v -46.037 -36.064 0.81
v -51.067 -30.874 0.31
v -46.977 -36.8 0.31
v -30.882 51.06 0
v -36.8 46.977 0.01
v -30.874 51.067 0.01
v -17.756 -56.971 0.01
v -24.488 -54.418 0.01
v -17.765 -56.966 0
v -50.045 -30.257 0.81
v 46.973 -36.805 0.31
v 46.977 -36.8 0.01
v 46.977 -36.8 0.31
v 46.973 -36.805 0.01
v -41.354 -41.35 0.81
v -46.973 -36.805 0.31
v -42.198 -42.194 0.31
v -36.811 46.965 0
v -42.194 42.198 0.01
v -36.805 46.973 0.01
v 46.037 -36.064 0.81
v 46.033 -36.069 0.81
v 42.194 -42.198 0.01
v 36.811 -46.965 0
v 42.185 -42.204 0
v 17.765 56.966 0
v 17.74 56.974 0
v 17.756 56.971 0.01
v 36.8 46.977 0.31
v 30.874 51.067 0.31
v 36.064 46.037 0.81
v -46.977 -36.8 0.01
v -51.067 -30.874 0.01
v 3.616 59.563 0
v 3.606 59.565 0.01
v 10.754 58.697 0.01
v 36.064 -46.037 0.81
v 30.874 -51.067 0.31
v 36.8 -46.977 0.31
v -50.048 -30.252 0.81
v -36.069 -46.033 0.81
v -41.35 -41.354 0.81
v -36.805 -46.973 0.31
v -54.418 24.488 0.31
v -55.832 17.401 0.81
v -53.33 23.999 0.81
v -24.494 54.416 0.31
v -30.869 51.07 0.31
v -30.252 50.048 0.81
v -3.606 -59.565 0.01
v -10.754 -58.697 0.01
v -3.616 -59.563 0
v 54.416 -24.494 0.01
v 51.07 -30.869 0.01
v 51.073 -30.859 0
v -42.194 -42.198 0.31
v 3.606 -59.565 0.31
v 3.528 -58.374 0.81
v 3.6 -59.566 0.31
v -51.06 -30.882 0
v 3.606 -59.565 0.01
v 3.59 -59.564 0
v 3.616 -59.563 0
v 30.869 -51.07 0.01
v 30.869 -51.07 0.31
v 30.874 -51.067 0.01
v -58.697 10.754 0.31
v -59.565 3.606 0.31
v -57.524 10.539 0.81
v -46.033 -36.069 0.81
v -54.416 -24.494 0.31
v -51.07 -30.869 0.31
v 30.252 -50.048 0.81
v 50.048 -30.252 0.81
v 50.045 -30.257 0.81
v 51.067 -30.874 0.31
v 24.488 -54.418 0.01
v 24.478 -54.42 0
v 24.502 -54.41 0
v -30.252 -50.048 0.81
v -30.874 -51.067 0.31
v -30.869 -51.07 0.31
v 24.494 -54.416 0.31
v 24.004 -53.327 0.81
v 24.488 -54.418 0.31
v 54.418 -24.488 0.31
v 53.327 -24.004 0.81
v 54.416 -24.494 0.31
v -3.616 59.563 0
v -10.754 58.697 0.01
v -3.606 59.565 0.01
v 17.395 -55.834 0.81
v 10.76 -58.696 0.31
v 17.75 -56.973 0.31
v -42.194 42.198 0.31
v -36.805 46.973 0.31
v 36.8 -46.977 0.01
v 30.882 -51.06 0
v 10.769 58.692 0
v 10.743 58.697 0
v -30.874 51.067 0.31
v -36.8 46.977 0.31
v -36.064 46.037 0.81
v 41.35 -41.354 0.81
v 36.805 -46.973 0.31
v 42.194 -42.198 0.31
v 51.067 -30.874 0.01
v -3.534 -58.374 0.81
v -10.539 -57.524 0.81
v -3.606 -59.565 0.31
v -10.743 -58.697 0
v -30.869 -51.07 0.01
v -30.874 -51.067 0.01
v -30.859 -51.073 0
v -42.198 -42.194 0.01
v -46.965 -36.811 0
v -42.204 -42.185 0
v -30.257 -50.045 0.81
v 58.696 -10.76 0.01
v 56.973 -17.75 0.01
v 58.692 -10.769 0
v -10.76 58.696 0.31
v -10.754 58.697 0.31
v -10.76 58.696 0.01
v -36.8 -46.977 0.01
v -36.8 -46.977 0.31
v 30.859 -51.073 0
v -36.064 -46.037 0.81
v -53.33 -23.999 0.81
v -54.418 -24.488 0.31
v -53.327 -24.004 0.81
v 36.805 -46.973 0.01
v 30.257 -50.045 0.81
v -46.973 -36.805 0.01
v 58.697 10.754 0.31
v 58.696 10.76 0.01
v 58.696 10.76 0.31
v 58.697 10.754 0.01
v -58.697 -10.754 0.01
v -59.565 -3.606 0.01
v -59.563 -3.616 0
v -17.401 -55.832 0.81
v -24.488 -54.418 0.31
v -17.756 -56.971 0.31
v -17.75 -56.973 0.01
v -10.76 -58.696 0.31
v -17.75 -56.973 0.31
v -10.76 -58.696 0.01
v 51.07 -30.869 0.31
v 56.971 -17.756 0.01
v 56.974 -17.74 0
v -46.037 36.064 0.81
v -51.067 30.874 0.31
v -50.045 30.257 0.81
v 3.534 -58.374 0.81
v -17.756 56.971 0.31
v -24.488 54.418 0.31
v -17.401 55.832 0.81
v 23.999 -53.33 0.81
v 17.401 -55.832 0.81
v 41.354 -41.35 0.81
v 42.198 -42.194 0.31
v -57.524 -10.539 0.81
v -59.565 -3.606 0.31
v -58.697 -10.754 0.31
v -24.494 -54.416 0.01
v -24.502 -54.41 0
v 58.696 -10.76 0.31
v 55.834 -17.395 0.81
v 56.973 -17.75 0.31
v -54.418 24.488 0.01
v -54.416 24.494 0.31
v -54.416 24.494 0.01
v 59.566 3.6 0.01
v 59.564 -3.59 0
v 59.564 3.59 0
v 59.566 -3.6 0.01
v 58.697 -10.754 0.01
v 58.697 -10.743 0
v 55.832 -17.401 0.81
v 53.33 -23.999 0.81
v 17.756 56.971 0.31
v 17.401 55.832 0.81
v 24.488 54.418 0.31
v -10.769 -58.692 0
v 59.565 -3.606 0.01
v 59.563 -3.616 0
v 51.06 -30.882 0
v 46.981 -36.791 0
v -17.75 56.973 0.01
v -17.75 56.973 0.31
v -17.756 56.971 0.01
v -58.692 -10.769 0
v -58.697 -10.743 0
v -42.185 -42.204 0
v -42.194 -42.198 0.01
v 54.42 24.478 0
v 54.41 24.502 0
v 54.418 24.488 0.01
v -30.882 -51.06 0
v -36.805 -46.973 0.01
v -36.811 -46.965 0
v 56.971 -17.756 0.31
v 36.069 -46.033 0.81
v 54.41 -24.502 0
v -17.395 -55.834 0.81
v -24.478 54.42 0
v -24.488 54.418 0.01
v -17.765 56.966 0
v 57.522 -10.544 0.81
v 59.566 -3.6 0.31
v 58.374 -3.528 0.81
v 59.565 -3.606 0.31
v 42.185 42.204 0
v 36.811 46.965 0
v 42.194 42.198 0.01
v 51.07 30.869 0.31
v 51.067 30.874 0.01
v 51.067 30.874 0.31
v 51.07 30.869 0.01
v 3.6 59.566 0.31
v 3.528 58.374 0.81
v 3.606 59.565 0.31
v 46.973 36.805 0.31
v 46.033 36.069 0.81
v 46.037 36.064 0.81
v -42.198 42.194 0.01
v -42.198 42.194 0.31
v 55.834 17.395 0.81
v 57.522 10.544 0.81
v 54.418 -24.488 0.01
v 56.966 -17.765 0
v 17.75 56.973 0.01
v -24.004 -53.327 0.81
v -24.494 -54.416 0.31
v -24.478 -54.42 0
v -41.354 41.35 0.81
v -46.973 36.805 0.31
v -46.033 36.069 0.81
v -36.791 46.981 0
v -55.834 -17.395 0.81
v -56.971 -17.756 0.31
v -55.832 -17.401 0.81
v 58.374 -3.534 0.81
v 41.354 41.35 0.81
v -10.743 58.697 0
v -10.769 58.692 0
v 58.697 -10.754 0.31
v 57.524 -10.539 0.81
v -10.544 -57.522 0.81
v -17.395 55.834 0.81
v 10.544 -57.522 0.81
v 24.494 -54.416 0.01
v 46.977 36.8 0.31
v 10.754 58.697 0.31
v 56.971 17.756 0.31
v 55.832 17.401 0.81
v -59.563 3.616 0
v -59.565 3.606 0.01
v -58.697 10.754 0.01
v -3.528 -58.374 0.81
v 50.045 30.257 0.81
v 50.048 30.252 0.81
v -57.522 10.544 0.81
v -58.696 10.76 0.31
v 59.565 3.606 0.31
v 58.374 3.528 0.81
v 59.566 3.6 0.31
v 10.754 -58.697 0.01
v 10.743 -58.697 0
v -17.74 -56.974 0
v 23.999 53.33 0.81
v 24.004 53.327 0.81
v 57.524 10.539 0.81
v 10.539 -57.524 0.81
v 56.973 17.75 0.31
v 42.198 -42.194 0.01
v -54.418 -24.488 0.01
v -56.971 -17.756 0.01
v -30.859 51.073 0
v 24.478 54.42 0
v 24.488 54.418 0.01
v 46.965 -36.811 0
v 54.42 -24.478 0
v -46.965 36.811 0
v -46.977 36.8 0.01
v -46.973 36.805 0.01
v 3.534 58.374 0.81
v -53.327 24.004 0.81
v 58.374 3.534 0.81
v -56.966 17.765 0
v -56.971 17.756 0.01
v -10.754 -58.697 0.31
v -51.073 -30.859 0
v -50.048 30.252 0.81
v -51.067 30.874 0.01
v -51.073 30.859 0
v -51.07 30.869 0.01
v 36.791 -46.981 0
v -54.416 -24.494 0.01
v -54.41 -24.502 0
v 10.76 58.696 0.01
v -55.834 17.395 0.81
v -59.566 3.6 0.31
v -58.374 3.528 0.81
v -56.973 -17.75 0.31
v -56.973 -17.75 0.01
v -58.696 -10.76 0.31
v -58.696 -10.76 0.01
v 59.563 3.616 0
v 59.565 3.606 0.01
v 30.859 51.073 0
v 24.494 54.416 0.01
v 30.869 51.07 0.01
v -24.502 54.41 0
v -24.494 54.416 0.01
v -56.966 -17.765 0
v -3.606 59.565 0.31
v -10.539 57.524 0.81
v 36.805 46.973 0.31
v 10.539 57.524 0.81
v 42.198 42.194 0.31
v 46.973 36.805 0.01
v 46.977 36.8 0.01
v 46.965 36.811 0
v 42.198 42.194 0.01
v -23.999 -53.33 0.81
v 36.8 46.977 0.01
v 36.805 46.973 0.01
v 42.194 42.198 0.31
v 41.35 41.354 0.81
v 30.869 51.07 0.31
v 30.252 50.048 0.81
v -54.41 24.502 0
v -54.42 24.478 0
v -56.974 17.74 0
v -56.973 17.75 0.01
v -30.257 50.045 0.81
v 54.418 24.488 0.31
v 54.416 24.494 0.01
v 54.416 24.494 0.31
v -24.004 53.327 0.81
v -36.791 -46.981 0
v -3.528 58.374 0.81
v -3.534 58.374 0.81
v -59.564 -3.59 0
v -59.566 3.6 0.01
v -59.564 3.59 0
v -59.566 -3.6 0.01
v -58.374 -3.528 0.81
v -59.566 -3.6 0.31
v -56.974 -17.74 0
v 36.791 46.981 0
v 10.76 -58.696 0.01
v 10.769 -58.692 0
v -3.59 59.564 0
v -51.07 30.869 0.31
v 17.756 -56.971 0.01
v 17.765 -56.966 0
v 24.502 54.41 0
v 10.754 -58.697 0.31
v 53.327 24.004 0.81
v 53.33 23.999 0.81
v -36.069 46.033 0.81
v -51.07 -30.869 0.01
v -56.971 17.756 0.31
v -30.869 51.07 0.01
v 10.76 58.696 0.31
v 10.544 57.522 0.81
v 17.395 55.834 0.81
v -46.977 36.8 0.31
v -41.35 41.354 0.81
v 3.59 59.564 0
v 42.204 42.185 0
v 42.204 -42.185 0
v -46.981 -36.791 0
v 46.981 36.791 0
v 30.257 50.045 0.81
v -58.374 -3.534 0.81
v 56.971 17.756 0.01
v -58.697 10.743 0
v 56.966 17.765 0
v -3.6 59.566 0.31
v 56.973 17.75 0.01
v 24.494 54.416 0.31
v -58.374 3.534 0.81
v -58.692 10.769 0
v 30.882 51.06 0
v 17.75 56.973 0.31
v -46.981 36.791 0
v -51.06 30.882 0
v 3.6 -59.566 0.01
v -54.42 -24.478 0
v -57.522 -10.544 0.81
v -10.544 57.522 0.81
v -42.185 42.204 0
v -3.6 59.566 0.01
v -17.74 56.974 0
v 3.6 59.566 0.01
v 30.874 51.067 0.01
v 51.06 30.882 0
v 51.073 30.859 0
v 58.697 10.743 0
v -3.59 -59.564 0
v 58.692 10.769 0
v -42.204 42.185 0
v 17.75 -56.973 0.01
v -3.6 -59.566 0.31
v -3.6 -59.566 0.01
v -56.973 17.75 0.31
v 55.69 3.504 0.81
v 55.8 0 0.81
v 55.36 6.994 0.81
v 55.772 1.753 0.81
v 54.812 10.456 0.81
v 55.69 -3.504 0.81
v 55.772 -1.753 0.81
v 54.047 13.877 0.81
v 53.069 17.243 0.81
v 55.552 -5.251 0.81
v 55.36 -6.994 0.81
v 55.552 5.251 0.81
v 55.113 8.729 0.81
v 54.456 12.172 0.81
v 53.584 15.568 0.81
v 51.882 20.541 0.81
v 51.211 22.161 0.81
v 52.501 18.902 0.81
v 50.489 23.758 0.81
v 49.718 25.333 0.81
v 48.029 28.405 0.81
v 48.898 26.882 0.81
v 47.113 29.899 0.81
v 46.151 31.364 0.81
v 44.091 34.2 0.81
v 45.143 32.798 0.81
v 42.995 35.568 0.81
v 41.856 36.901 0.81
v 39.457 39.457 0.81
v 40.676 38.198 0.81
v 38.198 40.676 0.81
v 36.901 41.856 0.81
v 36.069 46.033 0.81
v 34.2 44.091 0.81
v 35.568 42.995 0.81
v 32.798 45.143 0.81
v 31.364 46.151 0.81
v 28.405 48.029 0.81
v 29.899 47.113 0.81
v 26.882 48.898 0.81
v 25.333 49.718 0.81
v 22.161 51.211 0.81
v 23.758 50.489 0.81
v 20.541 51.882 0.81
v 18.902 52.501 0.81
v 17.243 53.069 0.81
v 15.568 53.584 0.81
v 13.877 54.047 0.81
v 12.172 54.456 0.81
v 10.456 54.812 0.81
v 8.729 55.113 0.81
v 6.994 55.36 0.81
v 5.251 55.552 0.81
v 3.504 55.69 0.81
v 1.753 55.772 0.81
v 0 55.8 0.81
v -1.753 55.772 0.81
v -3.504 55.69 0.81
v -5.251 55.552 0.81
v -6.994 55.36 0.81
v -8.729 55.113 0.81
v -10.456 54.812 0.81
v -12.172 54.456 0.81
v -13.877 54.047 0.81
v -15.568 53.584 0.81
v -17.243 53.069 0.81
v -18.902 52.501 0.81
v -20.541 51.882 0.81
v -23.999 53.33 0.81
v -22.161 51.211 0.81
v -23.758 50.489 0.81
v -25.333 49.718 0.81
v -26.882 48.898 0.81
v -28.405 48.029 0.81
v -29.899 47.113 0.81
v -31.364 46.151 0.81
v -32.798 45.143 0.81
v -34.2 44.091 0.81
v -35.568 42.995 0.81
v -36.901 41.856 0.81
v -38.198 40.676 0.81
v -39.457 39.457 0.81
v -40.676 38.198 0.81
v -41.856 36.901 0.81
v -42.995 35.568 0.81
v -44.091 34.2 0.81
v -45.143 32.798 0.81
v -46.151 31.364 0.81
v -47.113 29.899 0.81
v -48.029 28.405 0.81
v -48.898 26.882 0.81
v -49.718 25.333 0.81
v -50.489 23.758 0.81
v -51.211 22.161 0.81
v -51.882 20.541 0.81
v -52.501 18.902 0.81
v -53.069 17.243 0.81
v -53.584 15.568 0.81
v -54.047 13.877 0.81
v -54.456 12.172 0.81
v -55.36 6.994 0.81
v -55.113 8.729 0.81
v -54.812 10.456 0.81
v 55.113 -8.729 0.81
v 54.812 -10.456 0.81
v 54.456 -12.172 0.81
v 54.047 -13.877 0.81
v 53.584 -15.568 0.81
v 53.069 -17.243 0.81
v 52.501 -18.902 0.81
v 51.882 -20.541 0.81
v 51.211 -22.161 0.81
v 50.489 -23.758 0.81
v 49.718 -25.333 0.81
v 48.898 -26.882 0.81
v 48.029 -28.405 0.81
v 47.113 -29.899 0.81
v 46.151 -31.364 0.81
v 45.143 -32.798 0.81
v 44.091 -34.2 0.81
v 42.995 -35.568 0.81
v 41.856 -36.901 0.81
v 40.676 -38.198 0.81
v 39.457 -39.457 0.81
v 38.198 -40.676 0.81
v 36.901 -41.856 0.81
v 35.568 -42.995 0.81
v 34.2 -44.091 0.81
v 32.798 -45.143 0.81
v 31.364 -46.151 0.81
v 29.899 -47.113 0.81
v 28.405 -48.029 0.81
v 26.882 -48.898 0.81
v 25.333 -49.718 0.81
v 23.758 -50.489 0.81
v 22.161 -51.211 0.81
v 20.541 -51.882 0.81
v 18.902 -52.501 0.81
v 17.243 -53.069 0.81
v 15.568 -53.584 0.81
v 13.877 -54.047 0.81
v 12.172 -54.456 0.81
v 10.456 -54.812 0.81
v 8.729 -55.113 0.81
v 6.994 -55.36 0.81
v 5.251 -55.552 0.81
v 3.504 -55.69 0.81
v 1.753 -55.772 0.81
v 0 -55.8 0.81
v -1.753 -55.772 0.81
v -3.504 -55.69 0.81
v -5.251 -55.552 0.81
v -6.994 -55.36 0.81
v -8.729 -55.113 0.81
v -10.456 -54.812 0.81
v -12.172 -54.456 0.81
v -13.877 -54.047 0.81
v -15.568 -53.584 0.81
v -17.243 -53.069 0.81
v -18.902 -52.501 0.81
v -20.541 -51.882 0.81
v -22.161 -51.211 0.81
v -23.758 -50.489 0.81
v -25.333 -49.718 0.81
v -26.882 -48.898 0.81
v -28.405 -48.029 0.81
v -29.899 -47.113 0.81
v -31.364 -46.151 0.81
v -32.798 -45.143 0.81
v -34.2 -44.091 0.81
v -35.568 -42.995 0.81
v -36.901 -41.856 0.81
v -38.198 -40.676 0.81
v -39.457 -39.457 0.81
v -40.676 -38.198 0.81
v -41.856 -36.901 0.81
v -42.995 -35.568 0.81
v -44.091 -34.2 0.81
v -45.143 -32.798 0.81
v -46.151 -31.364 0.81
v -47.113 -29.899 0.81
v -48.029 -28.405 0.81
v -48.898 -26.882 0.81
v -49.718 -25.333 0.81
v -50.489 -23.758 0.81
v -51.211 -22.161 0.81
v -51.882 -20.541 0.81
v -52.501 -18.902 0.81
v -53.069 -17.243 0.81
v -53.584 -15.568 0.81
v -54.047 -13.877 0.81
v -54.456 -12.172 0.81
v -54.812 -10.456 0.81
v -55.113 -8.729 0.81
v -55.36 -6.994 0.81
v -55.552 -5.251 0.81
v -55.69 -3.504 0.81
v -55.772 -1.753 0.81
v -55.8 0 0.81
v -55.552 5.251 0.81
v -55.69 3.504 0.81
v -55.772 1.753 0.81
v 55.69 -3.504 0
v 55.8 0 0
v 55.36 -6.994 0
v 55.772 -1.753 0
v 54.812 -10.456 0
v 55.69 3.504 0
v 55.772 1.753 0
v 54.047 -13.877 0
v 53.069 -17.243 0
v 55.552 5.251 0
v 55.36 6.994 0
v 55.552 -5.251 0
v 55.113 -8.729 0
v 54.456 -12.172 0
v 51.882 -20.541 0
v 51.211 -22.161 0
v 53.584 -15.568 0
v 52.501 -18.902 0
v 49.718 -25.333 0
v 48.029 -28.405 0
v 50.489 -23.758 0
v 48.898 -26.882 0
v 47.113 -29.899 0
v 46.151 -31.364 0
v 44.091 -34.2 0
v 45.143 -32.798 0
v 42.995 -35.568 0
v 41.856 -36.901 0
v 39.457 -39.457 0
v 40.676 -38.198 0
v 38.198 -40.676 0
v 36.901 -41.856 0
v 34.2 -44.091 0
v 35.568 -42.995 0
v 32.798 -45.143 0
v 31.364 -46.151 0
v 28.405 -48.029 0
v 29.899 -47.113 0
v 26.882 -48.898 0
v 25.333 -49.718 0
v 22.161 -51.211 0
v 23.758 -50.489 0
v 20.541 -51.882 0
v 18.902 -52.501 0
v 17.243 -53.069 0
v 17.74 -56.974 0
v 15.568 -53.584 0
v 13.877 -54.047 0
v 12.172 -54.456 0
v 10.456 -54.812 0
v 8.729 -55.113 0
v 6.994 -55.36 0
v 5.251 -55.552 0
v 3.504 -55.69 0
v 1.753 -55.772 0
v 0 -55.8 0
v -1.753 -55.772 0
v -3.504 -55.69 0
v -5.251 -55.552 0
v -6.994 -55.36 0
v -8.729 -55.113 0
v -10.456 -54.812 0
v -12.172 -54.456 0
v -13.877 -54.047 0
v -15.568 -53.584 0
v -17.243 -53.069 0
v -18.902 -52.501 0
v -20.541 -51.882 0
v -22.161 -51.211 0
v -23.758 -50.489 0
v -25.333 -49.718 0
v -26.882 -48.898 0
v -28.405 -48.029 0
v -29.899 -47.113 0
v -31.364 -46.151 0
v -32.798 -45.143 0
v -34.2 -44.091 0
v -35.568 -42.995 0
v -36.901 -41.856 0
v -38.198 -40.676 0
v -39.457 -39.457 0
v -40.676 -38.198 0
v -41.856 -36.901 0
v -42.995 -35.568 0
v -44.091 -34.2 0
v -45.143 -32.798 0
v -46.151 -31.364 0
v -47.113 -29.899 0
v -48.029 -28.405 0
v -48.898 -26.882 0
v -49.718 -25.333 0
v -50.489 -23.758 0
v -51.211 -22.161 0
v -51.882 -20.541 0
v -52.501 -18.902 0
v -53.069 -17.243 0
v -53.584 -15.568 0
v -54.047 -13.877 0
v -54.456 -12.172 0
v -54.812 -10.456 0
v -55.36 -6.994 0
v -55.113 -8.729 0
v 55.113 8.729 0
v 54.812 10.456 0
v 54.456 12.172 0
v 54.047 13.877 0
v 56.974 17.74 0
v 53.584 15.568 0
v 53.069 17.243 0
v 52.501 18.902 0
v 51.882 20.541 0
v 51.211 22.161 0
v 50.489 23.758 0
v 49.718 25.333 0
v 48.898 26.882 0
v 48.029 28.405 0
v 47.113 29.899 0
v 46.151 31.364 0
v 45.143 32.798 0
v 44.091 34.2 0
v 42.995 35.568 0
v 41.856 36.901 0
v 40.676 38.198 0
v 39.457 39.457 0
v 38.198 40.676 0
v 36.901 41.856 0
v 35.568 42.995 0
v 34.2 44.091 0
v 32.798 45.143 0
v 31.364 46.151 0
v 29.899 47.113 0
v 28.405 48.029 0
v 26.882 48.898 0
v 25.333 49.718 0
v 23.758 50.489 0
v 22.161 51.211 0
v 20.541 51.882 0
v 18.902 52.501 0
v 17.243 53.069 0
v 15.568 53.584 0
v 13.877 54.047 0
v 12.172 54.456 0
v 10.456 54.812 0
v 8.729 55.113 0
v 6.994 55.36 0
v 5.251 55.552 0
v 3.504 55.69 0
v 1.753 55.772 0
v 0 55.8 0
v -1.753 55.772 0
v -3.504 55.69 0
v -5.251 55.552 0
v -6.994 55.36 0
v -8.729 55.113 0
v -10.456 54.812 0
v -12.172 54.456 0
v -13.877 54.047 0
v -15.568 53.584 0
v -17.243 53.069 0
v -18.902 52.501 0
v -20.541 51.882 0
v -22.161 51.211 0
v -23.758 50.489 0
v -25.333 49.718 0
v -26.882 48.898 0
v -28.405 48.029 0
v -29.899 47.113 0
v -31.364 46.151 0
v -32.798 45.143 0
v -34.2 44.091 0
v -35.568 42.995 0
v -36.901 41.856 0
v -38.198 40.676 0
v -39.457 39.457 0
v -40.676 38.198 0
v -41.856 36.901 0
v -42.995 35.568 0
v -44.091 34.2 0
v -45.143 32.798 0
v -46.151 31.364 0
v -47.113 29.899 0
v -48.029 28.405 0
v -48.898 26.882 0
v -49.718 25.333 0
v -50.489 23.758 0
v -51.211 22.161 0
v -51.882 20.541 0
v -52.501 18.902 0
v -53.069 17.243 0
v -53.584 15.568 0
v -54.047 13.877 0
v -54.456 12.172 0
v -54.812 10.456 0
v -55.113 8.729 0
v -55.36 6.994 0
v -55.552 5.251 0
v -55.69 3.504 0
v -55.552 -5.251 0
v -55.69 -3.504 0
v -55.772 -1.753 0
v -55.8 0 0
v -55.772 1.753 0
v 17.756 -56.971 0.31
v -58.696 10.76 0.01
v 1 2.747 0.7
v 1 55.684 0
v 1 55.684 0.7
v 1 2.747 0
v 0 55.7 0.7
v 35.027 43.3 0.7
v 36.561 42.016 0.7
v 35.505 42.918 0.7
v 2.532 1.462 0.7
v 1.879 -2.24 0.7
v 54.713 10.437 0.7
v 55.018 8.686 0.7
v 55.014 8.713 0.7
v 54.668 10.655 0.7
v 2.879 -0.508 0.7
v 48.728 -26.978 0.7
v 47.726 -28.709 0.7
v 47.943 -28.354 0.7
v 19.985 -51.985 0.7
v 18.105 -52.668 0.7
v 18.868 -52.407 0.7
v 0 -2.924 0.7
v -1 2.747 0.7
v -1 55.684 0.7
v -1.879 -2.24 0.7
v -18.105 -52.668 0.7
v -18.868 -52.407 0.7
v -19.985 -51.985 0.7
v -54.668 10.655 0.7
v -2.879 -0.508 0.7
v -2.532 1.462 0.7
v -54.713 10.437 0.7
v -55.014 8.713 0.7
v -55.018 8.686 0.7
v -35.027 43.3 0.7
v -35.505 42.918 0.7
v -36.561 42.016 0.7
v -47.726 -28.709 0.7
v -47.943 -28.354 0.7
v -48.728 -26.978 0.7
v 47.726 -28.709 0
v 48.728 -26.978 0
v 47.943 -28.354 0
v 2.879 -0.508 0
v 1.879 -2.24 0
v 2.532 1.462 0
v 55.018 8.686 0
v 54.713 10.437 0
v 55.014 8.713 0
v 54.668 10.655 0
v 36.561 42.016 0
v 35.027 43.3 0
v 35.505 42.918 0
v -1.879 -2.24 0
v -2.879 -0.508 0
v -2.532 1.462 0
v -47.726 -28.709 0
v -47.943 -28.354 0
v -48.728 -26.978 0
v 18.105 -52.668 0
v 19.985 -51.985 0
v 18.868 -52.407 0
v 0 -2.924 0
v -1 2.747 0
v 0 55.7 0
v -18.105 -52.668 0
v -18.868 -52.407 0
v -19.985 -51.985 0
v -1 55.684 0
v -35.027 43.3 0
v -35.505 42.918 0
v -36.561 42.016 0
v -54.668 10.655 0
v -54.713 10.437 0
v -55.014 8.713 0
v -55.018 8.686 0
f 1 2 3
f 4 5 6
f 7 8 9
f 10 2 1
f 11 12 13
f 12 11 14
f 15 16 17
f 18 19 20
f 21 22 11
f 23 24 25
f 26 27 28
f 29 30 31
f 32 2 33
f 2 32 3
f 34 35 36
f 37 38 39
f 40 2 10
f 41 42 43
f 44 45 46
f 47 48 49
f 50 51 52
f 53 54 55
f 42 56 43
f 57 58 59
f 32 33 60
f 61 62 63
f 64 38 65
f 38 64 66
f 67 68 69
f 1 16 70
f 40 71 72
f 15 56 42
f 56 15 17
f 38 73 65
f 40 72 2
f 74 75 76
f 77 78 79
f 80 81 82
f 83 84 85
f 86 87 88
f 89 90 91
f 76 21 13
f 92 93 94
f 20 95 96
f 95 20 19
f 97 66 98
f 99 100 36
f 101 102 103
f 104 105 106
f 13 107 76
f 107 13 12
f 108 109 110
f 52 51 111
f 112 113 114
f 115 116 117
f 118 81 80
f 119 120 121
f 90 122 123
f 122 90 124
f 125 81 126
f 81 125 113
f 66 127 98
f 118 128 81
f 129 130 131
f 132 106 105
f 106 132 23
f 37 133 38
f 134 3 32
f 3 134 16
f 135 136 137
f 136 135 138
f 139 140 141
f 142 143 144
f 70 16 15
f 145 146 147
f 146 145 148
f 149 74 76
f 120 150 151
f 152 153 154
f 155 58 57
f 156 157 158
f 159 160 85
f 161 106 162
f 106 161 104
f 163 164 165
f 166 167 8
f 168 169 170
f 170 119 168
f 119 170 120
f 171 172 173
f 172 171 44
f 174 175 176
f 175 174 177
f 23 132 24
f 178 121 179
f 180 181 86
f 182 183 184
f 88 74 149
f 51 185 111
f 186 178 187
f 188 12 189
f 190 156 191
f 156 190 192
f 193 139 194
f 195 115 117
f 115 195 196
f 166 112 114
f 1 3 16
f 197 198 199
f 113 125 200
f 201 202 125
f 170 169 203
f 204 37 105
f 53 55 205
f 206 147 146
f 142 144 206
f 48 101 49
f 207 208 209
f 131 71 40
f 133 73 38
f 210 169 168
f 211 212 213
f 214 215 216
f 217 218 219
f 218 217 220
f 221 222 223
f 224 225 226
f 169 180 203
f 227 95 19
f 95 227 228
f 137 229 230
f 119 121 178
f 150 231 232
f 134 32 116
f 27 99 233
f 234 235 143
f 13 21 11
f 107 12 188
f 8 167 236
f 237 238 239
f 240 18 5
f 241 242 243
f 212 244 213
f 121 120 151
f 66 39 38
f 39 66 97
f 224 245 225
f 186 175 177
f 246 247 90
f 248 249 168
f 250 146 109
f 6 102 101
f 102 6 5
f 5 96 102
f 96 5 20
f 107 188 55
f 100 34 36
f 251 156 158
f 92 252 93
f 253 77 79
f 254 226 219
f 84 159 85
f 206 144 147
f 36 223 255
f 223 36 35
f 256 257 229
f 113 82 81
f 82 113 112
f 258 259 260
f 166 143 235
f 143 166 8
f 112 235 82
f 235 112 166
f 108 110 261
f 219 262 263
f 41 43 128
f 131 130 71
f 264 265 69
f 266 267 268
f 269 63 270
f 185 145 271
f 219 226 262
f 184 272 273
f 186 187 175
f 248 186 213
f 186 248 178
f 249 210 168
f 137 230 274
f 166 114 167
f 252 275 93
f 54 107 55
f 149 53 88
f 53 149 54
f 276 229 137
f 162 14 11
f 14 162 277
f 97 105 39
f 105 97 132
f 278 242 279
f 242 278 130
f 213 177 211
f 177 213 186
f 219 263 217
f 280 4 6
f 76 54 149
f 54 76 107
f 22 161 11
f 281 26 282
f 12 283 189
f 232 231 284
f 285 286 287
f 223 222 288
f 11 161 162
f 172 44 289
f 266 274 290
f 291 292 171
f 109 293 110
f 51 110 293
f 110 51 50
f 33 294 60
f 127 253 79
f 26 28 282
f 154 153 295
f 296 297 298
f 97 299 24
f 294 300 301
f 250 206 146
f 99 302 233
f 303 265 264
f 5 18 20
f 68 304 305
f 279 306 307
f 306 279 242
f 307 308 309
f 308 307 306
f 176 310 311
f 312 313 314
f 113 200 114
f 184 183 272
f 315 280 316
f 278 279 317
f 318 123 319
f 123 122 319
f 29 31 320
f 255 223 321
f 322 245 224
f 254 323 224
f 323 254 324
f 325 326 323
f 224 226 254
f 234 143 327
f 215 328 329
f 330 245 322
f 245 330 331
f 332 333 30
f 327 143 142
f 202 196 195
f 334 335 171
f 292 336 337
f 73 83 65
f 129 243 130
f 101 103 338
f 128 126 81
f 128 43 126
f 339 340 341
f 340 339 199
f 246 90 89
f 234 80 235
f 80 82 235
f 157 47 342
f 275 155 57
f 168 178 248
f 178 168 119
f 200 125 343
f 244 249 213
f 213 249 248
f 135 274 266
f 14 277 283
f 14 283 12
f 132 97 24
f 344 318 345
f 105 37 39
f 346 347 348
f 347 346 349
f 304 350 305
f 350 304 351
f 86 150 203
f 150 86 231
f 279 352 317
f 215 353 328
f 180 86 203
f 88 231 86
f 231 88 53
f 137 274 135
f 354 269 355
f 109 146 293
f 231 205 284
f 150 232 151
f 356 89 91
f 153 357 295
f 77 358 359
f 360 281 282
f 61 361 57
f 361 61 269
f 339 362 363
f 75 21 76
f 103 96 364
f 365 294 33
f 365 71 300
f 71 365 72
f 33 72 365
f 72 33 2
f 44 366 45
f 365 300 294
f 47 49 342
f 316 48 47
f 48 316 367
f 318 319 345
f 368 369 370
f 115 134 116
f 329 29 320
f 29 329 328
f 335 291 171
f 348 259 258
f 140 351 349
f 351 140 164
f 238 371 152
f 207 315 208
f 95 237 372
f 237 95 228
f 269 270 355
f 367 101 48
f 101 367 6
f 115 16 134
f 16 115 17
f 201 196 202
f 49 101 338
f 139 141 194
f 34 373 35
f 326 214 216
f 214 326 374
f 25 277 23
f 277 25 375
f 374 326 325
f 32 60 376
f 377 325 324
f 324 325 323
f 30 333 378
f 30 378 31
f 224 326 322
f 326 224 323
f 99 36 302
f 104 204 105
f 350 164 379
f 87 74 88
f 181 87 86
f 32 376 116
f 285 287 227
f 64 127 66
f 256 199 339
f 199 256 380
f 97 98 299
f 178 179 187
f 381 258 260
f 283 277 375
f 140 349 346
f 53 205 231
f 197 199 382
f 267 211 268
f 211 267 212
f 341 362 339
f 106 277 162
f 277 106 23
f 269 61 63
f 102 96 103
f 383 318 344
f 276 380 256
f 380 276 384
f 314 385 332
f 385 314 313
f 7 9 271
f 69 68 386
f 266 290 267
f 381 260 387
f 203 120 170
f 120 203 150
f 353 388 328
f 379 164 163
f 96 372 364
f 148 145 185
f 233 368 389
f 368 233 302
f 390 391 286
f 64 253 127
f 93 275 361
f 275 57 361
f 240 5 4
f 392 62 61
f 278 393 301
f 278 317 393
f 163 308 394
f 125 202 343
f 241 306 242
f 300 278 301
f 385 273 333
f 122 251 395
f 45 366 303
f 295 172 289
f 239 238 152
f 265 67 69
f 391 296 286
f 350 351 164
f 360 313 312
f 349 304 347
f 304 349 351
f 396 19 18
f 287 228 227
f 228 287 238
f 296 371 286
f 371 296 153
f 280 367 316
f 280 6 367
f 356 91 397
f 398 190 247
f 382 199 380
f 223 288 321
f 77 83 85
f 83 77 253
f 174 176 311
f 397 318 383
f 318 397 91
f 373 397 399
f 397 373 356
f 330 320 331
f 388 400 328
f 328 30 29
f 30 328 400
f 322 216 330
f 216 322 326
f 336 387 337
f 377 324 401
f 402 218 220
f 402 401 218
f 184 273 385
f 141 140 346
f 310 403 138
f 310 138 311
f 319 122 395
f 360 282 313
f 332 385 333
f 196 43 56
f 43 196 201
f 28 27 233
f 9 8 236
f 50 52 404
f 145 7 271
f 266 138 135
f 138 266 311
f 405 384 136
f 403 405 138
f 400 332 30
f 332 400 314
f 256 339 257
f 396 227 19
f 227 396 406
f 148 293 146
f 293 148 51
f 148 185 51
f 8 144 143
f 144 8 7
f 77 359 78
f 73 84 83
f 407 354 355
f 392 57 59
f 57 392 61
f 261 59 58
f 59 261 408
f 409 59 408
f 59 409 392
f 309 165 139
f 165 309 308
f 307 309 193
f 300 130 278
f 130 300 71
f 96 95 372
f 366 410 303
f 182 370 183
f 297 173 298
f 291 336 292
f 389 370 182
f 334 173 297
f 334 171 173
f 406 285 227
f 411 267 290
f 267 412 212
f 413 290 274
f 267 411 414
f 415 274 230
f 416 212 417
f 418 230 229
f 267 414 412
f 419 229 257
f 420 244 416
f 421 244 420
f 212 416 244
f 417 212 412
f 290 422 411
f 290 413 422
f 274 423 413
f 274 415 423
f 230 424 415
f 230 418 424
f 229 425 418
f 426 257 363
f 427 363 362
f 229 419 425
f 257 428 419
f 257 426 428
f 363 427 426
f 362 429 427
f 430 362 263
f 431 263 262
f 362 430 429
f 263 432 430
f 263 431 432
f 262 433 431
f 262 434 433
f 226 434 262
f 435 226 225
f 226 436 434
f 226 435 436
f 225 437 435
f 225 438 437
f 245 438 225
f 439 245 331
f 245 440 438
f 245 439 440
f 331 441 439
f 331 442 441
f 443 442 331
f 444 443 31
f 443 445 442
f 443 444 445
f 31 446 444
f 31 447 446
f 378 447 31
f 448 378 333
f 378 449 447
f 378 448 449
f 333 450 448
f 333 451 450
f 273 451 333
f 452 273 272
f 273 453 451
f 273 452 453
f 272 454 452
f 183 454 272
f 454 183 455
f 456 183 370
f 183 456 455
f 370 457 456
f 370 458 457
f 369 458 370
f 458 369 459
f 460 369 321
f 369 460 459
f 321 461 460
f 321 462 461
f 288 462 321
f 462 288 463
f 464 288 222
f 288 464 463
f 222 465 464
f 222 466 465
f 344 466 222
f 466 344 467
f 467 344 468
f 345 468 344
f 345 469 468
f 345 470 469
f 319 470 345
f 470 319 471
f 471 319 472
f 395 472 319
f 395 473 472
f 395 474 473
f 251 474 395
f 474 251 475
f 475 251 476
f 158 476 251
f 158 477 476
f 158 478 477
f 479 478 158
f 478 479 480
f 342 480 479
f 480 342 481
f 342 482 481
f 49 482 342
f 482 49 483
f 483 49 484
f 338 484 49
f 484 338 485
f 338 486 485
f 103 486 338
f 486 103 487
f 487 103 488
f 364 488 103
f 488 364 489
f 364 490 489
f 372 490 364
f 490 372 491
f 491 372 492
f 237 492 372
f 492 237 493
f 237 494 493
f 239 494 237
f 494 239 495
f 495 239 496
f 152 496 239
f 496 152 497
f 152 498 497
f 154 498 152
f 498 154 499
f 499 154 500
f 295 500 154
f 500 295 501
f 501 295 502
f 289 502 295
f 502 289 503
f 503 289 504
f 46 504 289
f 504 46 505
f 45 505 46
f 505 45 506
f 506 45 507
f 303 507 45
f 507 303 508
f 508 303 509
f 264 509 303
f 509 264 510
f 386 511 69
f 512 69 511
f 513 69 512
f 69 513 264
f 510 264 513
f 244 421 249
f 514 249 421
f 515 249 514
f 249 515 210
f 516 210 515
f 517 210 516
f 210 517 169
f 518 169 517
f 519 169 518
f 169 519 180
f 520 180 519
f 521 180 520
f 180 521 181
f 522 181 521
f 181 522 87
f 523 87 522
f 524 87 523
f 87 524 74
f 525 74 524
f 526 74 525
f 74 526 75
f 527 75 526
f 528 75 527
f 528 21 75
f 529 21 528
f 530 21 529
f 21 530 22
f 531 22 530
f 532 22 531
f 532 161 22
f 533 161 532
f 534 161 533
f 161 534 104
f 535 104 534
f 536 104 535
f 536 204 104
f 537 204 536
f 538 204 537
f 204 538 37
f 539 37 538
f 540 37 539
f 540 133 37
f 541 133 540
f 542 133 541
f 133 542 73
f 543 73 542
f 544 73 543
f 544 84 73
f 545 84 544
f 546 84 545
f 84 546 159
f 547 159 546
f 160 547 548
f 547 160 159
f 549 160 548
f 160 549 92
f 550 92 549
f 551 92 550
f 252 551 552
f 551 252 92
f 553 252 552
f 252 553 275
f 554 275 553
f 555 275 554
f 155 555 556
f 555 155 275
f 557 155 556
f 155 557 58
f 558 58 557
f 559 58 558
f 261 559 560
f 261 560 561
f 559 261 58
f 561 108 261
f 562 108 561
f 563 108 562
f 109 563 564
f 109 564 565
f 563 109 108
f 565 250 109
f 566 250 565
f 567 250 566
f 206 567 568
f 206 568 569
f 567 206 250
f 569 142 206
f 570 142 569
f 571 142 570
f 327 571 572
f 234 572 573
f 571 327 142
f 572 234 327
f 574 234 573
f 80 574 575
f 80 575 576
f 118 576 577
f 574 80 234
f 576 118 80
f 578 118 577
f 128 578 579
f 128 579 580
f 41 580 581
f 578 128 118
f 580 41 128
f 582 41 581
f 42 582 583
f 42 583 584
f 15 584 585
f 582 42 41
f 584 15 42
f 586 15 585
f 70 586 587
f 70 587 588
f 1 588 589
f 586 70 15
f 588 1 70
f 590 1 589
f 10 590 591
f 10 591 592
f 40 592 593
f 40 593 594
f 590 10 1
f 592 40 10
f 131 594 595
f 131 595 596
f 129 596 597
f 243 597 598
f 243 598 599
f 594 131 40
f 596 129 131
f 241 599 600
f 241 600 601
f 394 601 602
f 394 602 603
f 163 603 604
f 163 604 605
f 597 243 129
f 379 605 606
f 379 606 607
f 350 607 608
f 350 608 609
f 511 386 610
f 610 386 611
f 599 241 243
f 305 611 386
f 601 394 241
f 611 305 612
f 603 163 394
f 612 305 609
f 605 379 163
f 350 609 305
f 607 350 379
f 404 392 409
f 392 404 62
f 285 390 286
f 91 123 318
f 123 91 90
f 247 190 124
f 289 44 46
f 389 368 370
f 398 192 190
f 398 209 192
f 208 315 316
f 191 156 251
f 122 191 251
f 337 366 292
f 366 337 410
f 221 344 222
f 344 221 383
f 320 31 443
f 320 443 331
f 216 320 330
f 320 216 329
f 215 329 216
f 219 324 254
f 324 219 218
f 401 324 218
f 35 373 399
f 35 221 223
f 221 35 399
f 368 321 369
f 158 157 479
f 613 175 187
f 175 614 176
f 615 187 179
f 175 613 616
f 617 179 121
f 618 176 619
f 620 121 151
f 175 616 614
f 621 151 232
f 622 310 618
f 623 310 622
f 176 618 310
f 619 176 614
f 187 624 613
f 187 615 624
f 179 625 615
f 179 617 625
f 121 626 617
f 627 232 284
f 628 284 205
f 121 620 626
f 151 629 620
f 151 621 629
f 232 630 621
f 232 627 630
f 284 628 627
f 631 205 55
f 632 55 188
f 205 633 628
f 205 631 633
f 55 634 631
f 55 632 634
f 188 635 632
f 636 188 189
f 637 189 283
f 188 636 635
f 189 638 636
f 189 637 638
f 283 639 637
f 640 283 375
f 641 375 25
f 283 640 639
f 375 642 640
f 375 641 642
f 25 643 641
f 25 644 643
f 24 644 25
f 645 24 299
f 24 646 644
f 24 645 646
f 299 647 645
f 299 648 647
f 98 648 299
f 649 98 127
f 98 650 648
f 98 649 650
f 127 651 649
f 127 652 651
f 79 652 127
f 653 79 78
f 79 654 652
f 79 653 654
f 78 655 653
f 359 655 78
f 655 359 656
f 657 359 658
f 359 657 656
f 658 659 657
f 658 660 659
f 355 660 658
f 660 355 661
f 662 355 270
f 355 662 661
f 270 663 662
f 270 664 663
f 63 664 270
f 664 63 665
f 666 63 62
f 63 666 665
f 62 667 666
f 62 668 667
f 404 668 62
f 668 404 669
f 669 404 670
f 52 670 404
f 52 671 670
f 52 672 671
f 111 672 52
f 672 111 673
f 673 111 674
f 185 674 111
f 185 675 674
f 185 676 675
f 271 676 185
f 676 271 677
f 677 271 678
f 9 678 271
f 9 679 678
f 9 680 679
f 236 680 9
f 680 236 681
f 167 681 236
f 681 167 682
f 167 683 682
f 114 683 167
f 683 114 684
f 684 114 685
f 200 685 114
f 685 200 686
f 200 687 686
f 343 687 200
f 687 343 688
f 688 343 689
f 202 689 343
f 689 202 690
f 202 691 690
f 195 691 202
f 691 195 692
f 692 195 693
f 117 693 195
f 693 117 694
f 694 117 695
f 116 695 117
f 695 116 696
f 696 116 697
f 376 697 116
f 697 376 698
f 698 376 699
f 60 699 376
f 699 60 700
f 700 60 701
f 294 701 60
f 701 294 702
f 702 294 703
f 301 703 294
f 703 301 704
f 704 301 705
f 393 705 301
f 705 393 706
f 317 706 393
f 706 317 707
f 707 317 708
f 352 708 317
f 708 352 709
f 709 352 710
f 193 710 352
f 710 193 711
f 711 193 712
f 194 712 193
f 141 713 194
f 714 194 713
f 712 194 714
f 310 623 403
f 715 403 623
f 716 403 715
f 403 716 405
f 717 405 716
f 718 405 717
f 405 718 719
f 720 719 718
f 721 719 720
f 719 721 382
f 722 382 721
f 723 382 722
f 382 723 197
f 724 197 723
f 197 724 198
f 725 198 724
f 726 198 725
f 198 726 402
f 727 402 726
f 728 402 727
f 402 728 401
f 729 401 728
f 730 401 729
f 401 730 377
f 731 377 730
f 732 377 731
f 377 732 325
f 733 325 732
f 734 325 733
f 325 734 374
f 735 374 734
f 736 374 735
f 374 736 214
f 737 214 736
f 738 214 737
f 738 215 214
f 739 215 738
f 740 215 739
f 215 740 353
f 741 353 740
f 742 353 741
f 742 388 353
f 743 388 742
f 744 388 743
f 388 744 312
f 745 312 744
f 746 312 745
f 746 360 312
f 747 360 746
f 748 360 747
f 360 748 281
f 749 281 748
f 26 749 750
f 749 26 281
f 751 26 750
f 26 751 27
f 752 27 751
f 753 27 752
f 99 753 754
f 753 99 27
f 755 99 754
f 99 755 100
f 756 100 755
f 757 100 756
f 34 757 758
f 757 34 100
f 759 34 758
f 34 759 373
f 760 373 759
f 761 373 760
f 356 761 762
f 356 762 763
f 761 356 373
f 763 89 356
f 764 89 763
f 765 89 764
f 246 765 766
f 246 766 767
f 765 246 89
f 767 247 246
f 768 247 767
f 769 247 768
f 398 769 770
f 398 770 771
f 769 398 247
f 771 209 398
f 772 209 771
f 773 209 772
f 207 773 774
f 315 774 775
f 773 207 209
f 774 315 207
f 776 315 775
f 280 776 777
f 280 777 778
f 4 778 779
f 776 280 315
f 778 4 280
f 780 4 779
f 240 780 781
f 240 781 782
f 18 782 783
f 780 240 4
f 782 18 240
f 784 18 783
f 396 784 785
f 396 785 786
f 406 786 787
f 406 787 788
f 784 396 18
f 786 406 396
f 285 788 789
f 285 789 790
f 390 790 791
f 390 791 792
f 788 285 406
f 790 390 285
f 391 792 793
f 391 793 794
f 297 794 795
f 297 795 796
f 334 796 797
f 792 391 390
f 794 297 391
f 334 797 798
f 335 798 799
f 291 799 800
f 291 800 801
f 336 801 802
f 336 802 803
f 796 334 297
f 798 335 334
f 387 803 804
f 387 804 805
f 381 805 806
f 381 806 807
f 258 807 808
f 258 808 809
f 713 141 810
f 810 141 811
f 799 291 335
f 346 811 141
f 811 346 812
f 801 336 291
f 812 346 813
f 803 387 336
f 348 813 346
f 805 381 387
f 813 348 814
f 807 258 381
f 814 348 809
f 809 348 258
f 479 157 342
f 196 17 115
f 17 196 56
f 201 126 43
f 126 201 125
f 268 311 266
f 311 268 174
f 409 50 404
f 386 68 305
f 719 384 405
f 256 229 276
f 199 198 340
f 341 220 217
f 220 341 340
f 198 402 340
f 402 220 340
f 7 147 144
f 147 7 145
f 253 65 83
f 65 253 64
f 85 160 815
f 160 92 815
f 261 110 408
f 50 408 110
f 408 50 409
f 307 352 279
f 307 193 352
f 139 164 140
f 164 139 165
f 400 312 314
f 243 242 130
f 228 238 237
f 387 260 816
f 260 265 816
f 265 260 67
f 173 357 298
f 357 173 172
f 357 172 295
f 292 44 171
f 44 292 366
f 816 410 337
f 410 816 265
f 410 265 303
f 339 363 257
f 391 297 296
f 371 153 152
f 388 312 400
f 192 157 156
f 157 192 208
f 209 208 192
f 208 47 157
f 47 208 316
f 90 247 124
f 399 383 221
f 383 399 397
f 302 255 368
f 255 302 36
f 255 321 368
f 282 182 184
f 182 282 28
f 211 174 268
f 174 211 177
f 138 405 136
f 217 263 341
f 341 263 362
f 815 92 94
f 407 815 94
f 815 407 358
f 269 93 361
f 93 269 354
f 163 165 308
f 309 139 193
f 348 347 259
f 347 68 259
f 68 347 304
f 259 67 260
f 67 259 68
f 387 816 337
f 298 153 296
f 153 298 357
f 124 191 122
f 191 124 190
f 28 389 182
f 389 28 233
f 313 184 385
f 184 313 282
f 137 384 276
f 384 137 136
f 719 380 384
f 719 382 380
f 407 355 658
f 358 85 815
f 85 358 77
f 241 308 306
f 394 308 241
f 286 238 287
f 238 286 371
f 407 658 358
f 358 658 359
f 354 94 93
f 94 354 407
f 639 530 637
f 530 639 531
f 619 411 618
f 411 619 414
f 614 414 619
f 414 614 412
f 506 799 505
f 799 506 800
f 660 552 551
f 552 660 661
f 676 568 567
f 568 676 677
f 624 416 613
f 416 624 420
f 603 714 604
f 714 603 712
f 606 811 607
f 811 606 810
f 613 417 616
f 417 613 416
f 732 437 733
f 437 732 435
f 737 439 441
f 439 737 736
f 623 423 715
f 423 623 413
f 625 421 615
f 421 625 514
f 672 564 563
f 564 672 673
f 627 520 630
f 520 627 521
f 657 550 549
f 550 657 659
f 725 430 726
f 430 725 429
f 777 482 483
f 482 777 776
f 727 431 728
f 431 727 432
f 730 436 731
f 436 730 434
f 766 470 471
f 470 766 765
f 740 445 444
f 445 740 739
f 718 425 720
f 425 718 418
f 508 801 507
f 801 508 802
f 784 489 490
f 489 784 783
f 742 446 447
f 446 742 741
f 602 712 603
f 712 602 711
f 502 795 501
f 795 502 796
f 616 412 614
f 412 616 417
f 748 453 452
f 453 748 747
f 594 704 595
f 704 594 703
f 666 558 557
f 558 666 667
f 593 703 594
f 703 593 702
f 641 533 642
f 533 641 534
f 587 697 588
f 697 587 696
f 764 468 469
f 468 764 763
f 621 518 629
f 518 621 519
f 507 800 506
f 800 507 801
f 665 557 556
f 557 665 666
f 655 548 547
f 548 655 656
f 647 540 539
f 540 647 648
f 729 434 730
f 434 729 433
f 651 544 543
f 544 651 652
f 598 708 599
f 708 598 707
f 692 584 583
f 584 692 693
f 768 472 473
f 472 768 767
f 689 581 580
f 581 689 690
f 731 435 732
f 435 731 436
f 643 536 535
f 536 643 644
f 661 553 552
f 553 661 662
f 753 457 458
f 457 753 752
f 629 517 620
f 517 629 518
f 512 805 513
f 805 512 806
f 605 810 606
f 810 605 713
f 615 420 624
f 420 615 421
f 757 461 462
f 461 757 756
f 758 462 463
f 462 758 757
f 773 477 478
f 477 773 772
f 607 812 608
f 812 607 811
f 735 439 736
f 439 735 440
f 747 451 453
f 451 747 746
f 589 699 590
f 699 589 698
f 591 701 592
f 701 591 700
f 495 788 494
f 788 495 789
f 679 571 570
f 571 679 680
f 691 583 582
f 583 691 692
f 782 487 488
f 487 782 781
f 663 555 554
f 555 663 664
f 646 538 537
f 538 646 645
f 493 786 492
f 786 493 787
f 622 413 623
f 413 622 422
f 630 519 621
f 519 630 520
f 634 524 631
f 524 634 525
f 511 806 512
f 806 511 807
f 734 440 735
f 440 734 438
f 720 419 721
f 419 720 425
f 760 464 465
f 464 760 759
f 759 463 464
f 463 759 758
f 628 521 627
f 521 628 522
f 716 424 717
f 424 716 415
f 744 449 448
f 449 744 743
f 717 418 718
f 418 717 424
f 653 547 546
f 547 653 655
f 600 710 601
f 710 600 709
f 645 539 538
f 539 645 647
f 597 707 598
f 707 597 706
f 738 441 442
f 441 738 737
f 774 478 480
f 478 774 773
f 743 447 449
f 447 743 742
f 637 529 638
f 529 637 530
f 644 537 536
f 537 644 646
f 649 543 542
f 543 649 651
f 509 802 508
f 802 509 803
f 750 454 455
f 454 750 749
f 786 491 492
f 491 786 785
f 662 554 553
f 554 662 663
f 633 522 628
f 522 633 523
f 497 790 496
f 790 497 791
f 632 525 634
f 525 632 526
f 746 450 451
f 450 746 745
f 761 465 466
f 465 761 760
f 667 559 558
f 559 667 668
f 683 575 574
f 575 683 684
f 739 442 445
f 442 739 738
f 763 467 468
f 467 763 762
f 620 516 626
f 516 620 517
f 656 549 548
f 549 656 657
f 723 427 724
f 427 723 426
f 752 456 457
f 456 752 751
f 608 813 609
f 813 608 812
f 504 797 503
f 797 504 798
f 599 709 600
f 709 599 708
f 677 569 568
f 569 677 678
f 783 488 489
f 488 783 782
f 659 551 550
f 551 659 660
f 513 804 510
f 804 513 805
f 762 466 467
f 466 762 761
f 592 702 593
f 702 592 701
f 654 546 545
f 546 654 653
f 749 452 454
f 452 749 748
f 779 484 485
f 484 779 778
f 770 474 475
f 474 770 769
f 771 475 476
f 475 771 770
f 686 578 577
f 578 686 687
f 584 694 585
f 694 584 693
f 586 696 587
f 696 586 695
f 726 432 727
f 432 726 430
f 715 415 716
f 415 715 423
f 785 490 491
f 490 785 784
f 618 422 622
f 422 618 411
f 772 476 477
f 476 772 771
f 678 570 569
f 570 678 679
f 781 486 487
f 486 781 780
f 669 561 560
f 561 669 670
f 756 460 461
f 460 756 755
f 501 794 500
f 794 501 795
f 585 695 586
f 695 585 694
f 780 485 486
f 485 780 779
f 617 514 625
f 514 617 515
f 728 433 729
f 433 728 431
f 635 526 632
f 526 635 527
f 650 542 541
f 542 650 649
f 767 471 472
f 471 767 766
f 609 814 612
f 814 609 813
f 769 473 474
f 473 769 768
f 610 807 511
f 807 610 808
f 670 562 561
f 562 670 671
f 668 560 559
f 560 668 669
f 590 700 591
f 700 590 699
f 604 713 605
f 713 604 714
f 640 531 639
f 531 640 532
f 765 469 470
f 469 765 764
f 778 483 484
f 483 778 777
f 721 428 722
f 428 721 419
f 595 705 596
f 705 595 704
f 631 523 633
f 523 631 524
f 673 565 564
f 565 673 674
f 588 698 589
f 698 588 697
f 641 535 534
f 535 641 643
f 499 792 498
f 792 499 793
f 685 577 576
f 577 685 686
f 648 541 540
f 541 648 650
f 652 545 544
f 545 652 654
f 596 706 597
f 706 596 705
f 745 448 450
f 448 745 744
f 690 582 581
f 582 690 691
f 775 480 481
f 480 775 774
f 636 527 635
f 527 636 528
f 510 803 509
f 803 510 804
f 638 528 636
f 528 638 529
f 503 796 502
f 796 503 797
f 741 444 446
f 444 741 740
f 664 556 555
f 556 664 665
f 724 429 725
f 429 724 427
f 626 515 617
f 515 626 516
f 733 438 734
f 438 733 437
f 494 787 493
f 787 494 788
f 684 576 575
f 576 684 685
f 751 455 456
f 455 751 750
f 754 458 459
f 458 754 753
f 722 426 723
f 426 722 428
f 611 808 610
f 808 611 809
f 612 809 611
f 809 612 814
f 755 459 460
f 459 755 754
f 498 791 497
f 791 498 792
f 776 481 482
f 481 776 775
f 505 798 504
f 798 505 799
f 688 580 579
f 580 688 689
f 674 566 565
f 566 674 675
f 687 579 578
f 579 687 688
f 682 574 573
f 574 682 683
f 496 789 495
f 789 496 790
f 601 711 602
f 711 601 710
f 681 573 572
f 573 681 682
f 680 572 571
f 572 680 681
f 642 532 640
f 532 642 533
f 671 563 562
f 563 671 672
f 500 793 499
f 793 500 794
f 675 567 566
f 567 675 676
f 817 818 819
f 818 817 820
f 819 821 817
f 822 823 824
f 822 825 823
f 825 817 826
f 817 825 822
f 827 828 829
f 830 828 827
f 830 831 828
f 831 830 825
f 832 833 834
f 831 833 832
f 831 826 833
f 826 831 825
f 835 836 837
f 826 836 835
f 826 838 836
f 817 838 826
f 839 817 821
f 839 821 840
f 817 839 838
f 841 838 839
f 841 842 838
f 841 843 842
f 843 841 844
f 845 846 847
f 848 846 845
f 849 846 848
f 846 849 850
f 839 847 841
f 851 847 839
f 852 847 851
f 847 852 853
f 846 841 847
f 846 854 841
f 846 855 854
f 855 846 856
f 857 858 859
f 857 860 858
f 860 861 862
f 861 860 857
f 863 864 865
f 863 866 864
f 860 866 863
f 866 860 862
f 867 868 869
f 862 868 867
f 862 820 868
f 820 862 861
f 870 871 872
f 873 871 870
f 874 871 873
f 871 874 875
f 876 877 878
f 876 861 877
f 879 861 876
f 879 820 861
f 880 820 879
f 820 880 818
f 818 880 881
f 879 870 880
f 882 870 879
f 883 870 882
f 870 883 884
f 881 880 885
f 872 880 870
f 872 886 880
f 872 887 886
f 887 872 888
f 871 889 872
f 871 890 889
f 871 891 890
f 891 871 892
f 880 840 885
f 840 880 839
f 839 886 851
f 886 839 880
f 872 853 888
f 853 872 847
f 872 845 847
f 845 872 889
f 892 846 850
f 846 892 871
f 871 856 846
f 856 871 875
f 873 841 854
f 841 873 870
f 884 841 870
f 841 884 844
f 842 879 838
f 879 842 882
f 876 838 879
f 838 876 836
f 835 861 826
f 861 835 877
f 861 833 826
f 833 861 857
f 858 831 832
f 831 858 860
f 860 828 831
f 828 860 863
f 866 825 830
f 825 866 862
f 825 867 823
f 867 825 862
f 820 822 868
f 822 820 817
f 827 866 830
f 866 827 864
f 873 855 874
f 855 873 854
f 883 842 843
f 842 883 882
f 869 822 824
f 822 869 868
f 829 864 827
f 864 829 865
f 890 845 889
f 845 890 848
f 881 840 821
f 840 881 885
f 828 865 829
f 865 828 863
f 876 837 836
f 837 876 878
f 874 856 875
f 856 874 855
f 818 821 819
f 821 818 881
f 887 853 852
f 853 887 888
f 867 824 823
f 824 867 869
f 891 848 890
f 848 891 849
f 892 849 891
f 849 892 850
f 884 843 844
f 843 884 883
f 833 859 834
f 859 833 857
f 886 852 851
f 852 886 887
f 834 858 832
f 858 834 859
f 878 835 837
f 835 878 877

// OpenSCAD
/* Cylinder with central hole, to hold a bug killing electrical racket.

Faceted sides and hollow to be filled with concrete.
*/


INNER_DIAMETER =  39;
INNER_HEIGHT   = 150;
WALL           =   8;
PROTUDE        =   1;
R              = 120/2;
N              =  52;
A              = 360/N;
C              = sin(A) * R;
BASE_H         = C*2;
OUTER_HEIGHT   = INNER_HEIGHT + BASE_H;
M              = floor(OUTER_HEIGHT/C) + 1;
HEIGHT         = M * C;
SKIN           = 0.8;

ATOM = 0.01;
$fn = $preview ? 100 : 200;

function get_vars() = [N, M, R, INNER_DIAMETER, SKIN];

module ring(n, m, r, protude, inset=0) {
    a = 360/n;
    v = r * (1-cos(a));
    c = sin(a) * r;
    
    cylinder(r=r-v*2-inset, h=m*c);

    if (protude>0) {
        for(j=[0:m-1]) {
            for (i=[0:n-1]) {
                translate([0, 0, j*c])
                rotate([0, 0, 360/n*i])
                translate([r-v-inset, 0, c/2])
                rotate([0, 90, 0])
                hull() {
                    translate([0, 0, -WALL/4])
                    cube([c, c, WALL/2], center=true);

                    translate([0, 0, protude])
                    cube([ATOM, ATOM, ATOM], center=true);
                }
            }
        }
    }
}

module hole(extra=0) {
    translate([0, 0, BASE_H + INNER_DIAMETER/2]) {
        cylinder(d=INNER_DIAMETER+extra, h=HEIGHT*2);
        sphere(d=INNER_DIAMETER+extra);
    }
}

module all() {
    difference() {
        union() {
            ring(N, M, R, 0);
            ring(N, M, R, PROTUDE);
        }

        // hole
        hole();

        // chamfer
        h = INNER_DIAMETER*.75;
        translate([0, 0, HEIGHT - h + ATOM])
        cylinder(d2=INNER_DIAMETER + WALL*2 - 2, d1=0, h=h);

        // base hollowing
        difference() {
            translate([0, 0, -ATOM])
            ring(N, M-1, R, $preview?0:PROTUDE, inset=SKIN);
            
            hole(SKIN*2);
        }
    }
}

module cap() {
    k = .98;
    rr = R*k - 3;
    h = 1 - .2;
    difference() {
        hull() {
            for (z=[0, .3]) {
                translate([0, 0, z])
                intersection() {
                    ring(N, 1, R, PROTUDE);
                    cylinder(r=R*2, h=ATOM);
                }
            }

            translate([0, 0, h])
            scale([k, k, 1])
            intersection() {
                ring(N, 1, R, PROTUDE);
                cylinder(r=R*2, h=ATOM);
            }
        }
    
        cylinder(r=rr, h=2, center= true);
    }
    
    n = 9;
    intersection() {
        union()
        for (i=[0:n-1]) {
            rotate([0, 0, 360/n*i])
            translate([-1, 0, 0])
            cube([2, rr, .7]);
        }
        cylinder(r=rr-.1, h=2, center= true);
    }
}

if(1)
    cap();
else
rotate([0,180, 0])
difference() {
    all();
    //cube(1000);
}

echo(M);
